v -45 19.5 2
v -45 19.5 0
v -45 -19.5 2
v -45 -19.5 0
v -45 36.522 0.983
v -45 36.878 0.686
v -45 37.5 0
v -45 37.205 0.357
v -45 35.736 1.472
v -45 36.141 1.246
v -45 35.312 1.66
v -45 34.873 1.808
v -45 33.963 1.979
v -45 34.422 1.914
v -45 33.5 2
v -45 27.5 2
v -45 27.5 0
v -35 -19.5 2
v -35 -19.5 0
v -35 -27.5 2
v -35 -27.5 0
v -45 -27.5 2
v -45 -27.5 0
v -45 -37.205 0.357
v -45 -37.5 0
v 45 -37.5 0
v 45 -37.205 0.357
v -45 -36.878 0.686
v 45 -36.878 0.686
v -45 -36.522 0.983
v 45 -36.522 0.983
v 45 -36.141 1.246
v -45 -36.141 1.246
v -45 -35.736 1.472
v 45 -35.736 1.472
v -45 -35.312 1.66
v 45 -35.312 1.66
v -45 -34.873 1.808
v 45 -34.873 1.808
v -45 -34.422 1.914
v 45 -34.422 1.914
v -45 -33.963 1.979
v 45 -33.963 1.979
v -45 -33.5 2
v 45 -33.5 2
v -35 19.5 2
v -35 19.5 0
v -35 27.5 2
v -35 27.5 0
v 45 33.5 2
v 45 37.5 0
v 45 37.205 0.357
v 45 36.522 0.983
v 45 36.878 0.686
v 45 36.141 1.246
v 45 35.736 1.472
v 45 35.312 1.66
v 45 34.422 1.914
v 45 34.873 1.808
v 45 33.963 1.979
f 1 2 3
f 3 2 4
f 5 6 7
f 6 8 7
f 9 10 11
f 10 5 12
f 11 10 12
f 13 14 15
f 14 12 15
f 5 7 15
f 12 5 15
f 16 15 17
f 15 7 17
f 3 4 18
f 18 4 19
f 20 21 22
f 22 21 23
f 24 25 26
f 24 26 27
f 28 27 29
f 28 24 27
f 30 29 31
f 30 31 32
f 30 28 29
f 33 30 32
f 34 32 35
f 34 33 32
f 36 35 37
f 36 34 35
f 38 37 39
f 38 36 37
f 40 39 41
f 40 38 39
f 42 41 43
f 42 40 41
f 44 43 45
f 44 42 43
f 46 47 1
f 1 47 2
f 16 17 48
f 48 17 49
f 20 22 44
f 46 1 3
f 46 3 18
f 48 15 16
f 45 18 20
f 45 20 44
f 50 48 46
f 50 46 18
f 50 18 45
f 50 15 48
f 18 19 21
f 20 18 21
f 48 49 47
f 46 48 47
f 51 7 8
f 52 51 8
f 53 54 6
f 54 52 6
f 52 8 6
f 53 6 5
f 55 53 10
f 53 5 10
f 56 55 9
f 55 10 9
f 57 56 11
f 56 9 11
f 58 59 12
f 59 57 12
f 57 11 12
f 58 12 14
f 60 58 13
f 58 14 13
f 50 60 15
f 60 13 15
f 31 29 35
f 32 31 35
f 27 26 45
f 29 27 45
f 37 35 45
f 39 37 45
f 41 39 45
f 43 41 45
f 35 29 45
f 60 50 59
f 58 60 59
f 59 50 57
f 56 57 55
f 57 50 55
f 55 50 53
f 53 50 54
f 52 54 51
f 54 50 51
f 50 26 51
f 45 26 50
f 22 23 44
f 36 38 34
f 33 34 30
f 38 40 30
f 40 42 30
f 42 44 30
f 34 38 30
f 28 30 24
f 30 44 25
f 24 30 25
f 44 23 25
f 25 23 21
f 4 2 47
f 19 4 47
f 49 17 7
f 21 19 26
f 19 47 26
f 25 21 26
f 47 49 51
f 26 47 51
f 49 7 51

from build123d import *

# Parameters (mm, degrees)
F1_DEPTH    = 2
F2_T1_DEPTH = 110


# Not quite as in the source:
# - a fillet or chamfer that OpenCascade refuses, or shapes differently, is made with other operations: its cross-section is extruded or revolved along the edge and cut away or added


with BuildPart() as f1:
    # F0 (on Top) → F1 (new body)
    with BuildSketch(Plane.XY):
        Polygon((45, 27.5), (-35, 27.5), (-35, 19.5), (-45, 19.5), (-45, -19.5), (-35, -19.5), (-35, -27.5), (45, -27.5), align=None)
        Polygon((-45, 37.5), (-45, 27.5), (-35, 27.5), (45, 27.5), (45, 37.5), align=None)
        Polygon((45, -37.5), (45, -27.5), (-35, -27.5), (-45, -27.5), (-45, -37.5), align=None)
    extrude(amount=F1_DEPTH)

    # F2: fillet of radius 5 on 2 edges, made by hand

    # F2_s2 → F2_t1 (cut)
    with BuildSketch(Plane.YZ.offset(-55)):
        with BuildLine():
            ThreePointArc((37.5, 0), (35.7360679775, 1.472135955), (33.5, 2))
            Line((33.5, 2), (37.5, 2))
            Line((37.5, 2), (37.5, 0))
        make_face()
        with BuildLine():
            ThreePointArc((-37.5, 0), (-35.7360679775, 1.472135955), (-33.5, 2))
            Line((-33.5, 2), (-37.5, 2))
            Line((-37.5, 2), (-37.5, 0))
        make_face()
    extrude(amount=F2_T1_DEPTH, mode=Mode.SUBTRACT)


solid = f1.part
